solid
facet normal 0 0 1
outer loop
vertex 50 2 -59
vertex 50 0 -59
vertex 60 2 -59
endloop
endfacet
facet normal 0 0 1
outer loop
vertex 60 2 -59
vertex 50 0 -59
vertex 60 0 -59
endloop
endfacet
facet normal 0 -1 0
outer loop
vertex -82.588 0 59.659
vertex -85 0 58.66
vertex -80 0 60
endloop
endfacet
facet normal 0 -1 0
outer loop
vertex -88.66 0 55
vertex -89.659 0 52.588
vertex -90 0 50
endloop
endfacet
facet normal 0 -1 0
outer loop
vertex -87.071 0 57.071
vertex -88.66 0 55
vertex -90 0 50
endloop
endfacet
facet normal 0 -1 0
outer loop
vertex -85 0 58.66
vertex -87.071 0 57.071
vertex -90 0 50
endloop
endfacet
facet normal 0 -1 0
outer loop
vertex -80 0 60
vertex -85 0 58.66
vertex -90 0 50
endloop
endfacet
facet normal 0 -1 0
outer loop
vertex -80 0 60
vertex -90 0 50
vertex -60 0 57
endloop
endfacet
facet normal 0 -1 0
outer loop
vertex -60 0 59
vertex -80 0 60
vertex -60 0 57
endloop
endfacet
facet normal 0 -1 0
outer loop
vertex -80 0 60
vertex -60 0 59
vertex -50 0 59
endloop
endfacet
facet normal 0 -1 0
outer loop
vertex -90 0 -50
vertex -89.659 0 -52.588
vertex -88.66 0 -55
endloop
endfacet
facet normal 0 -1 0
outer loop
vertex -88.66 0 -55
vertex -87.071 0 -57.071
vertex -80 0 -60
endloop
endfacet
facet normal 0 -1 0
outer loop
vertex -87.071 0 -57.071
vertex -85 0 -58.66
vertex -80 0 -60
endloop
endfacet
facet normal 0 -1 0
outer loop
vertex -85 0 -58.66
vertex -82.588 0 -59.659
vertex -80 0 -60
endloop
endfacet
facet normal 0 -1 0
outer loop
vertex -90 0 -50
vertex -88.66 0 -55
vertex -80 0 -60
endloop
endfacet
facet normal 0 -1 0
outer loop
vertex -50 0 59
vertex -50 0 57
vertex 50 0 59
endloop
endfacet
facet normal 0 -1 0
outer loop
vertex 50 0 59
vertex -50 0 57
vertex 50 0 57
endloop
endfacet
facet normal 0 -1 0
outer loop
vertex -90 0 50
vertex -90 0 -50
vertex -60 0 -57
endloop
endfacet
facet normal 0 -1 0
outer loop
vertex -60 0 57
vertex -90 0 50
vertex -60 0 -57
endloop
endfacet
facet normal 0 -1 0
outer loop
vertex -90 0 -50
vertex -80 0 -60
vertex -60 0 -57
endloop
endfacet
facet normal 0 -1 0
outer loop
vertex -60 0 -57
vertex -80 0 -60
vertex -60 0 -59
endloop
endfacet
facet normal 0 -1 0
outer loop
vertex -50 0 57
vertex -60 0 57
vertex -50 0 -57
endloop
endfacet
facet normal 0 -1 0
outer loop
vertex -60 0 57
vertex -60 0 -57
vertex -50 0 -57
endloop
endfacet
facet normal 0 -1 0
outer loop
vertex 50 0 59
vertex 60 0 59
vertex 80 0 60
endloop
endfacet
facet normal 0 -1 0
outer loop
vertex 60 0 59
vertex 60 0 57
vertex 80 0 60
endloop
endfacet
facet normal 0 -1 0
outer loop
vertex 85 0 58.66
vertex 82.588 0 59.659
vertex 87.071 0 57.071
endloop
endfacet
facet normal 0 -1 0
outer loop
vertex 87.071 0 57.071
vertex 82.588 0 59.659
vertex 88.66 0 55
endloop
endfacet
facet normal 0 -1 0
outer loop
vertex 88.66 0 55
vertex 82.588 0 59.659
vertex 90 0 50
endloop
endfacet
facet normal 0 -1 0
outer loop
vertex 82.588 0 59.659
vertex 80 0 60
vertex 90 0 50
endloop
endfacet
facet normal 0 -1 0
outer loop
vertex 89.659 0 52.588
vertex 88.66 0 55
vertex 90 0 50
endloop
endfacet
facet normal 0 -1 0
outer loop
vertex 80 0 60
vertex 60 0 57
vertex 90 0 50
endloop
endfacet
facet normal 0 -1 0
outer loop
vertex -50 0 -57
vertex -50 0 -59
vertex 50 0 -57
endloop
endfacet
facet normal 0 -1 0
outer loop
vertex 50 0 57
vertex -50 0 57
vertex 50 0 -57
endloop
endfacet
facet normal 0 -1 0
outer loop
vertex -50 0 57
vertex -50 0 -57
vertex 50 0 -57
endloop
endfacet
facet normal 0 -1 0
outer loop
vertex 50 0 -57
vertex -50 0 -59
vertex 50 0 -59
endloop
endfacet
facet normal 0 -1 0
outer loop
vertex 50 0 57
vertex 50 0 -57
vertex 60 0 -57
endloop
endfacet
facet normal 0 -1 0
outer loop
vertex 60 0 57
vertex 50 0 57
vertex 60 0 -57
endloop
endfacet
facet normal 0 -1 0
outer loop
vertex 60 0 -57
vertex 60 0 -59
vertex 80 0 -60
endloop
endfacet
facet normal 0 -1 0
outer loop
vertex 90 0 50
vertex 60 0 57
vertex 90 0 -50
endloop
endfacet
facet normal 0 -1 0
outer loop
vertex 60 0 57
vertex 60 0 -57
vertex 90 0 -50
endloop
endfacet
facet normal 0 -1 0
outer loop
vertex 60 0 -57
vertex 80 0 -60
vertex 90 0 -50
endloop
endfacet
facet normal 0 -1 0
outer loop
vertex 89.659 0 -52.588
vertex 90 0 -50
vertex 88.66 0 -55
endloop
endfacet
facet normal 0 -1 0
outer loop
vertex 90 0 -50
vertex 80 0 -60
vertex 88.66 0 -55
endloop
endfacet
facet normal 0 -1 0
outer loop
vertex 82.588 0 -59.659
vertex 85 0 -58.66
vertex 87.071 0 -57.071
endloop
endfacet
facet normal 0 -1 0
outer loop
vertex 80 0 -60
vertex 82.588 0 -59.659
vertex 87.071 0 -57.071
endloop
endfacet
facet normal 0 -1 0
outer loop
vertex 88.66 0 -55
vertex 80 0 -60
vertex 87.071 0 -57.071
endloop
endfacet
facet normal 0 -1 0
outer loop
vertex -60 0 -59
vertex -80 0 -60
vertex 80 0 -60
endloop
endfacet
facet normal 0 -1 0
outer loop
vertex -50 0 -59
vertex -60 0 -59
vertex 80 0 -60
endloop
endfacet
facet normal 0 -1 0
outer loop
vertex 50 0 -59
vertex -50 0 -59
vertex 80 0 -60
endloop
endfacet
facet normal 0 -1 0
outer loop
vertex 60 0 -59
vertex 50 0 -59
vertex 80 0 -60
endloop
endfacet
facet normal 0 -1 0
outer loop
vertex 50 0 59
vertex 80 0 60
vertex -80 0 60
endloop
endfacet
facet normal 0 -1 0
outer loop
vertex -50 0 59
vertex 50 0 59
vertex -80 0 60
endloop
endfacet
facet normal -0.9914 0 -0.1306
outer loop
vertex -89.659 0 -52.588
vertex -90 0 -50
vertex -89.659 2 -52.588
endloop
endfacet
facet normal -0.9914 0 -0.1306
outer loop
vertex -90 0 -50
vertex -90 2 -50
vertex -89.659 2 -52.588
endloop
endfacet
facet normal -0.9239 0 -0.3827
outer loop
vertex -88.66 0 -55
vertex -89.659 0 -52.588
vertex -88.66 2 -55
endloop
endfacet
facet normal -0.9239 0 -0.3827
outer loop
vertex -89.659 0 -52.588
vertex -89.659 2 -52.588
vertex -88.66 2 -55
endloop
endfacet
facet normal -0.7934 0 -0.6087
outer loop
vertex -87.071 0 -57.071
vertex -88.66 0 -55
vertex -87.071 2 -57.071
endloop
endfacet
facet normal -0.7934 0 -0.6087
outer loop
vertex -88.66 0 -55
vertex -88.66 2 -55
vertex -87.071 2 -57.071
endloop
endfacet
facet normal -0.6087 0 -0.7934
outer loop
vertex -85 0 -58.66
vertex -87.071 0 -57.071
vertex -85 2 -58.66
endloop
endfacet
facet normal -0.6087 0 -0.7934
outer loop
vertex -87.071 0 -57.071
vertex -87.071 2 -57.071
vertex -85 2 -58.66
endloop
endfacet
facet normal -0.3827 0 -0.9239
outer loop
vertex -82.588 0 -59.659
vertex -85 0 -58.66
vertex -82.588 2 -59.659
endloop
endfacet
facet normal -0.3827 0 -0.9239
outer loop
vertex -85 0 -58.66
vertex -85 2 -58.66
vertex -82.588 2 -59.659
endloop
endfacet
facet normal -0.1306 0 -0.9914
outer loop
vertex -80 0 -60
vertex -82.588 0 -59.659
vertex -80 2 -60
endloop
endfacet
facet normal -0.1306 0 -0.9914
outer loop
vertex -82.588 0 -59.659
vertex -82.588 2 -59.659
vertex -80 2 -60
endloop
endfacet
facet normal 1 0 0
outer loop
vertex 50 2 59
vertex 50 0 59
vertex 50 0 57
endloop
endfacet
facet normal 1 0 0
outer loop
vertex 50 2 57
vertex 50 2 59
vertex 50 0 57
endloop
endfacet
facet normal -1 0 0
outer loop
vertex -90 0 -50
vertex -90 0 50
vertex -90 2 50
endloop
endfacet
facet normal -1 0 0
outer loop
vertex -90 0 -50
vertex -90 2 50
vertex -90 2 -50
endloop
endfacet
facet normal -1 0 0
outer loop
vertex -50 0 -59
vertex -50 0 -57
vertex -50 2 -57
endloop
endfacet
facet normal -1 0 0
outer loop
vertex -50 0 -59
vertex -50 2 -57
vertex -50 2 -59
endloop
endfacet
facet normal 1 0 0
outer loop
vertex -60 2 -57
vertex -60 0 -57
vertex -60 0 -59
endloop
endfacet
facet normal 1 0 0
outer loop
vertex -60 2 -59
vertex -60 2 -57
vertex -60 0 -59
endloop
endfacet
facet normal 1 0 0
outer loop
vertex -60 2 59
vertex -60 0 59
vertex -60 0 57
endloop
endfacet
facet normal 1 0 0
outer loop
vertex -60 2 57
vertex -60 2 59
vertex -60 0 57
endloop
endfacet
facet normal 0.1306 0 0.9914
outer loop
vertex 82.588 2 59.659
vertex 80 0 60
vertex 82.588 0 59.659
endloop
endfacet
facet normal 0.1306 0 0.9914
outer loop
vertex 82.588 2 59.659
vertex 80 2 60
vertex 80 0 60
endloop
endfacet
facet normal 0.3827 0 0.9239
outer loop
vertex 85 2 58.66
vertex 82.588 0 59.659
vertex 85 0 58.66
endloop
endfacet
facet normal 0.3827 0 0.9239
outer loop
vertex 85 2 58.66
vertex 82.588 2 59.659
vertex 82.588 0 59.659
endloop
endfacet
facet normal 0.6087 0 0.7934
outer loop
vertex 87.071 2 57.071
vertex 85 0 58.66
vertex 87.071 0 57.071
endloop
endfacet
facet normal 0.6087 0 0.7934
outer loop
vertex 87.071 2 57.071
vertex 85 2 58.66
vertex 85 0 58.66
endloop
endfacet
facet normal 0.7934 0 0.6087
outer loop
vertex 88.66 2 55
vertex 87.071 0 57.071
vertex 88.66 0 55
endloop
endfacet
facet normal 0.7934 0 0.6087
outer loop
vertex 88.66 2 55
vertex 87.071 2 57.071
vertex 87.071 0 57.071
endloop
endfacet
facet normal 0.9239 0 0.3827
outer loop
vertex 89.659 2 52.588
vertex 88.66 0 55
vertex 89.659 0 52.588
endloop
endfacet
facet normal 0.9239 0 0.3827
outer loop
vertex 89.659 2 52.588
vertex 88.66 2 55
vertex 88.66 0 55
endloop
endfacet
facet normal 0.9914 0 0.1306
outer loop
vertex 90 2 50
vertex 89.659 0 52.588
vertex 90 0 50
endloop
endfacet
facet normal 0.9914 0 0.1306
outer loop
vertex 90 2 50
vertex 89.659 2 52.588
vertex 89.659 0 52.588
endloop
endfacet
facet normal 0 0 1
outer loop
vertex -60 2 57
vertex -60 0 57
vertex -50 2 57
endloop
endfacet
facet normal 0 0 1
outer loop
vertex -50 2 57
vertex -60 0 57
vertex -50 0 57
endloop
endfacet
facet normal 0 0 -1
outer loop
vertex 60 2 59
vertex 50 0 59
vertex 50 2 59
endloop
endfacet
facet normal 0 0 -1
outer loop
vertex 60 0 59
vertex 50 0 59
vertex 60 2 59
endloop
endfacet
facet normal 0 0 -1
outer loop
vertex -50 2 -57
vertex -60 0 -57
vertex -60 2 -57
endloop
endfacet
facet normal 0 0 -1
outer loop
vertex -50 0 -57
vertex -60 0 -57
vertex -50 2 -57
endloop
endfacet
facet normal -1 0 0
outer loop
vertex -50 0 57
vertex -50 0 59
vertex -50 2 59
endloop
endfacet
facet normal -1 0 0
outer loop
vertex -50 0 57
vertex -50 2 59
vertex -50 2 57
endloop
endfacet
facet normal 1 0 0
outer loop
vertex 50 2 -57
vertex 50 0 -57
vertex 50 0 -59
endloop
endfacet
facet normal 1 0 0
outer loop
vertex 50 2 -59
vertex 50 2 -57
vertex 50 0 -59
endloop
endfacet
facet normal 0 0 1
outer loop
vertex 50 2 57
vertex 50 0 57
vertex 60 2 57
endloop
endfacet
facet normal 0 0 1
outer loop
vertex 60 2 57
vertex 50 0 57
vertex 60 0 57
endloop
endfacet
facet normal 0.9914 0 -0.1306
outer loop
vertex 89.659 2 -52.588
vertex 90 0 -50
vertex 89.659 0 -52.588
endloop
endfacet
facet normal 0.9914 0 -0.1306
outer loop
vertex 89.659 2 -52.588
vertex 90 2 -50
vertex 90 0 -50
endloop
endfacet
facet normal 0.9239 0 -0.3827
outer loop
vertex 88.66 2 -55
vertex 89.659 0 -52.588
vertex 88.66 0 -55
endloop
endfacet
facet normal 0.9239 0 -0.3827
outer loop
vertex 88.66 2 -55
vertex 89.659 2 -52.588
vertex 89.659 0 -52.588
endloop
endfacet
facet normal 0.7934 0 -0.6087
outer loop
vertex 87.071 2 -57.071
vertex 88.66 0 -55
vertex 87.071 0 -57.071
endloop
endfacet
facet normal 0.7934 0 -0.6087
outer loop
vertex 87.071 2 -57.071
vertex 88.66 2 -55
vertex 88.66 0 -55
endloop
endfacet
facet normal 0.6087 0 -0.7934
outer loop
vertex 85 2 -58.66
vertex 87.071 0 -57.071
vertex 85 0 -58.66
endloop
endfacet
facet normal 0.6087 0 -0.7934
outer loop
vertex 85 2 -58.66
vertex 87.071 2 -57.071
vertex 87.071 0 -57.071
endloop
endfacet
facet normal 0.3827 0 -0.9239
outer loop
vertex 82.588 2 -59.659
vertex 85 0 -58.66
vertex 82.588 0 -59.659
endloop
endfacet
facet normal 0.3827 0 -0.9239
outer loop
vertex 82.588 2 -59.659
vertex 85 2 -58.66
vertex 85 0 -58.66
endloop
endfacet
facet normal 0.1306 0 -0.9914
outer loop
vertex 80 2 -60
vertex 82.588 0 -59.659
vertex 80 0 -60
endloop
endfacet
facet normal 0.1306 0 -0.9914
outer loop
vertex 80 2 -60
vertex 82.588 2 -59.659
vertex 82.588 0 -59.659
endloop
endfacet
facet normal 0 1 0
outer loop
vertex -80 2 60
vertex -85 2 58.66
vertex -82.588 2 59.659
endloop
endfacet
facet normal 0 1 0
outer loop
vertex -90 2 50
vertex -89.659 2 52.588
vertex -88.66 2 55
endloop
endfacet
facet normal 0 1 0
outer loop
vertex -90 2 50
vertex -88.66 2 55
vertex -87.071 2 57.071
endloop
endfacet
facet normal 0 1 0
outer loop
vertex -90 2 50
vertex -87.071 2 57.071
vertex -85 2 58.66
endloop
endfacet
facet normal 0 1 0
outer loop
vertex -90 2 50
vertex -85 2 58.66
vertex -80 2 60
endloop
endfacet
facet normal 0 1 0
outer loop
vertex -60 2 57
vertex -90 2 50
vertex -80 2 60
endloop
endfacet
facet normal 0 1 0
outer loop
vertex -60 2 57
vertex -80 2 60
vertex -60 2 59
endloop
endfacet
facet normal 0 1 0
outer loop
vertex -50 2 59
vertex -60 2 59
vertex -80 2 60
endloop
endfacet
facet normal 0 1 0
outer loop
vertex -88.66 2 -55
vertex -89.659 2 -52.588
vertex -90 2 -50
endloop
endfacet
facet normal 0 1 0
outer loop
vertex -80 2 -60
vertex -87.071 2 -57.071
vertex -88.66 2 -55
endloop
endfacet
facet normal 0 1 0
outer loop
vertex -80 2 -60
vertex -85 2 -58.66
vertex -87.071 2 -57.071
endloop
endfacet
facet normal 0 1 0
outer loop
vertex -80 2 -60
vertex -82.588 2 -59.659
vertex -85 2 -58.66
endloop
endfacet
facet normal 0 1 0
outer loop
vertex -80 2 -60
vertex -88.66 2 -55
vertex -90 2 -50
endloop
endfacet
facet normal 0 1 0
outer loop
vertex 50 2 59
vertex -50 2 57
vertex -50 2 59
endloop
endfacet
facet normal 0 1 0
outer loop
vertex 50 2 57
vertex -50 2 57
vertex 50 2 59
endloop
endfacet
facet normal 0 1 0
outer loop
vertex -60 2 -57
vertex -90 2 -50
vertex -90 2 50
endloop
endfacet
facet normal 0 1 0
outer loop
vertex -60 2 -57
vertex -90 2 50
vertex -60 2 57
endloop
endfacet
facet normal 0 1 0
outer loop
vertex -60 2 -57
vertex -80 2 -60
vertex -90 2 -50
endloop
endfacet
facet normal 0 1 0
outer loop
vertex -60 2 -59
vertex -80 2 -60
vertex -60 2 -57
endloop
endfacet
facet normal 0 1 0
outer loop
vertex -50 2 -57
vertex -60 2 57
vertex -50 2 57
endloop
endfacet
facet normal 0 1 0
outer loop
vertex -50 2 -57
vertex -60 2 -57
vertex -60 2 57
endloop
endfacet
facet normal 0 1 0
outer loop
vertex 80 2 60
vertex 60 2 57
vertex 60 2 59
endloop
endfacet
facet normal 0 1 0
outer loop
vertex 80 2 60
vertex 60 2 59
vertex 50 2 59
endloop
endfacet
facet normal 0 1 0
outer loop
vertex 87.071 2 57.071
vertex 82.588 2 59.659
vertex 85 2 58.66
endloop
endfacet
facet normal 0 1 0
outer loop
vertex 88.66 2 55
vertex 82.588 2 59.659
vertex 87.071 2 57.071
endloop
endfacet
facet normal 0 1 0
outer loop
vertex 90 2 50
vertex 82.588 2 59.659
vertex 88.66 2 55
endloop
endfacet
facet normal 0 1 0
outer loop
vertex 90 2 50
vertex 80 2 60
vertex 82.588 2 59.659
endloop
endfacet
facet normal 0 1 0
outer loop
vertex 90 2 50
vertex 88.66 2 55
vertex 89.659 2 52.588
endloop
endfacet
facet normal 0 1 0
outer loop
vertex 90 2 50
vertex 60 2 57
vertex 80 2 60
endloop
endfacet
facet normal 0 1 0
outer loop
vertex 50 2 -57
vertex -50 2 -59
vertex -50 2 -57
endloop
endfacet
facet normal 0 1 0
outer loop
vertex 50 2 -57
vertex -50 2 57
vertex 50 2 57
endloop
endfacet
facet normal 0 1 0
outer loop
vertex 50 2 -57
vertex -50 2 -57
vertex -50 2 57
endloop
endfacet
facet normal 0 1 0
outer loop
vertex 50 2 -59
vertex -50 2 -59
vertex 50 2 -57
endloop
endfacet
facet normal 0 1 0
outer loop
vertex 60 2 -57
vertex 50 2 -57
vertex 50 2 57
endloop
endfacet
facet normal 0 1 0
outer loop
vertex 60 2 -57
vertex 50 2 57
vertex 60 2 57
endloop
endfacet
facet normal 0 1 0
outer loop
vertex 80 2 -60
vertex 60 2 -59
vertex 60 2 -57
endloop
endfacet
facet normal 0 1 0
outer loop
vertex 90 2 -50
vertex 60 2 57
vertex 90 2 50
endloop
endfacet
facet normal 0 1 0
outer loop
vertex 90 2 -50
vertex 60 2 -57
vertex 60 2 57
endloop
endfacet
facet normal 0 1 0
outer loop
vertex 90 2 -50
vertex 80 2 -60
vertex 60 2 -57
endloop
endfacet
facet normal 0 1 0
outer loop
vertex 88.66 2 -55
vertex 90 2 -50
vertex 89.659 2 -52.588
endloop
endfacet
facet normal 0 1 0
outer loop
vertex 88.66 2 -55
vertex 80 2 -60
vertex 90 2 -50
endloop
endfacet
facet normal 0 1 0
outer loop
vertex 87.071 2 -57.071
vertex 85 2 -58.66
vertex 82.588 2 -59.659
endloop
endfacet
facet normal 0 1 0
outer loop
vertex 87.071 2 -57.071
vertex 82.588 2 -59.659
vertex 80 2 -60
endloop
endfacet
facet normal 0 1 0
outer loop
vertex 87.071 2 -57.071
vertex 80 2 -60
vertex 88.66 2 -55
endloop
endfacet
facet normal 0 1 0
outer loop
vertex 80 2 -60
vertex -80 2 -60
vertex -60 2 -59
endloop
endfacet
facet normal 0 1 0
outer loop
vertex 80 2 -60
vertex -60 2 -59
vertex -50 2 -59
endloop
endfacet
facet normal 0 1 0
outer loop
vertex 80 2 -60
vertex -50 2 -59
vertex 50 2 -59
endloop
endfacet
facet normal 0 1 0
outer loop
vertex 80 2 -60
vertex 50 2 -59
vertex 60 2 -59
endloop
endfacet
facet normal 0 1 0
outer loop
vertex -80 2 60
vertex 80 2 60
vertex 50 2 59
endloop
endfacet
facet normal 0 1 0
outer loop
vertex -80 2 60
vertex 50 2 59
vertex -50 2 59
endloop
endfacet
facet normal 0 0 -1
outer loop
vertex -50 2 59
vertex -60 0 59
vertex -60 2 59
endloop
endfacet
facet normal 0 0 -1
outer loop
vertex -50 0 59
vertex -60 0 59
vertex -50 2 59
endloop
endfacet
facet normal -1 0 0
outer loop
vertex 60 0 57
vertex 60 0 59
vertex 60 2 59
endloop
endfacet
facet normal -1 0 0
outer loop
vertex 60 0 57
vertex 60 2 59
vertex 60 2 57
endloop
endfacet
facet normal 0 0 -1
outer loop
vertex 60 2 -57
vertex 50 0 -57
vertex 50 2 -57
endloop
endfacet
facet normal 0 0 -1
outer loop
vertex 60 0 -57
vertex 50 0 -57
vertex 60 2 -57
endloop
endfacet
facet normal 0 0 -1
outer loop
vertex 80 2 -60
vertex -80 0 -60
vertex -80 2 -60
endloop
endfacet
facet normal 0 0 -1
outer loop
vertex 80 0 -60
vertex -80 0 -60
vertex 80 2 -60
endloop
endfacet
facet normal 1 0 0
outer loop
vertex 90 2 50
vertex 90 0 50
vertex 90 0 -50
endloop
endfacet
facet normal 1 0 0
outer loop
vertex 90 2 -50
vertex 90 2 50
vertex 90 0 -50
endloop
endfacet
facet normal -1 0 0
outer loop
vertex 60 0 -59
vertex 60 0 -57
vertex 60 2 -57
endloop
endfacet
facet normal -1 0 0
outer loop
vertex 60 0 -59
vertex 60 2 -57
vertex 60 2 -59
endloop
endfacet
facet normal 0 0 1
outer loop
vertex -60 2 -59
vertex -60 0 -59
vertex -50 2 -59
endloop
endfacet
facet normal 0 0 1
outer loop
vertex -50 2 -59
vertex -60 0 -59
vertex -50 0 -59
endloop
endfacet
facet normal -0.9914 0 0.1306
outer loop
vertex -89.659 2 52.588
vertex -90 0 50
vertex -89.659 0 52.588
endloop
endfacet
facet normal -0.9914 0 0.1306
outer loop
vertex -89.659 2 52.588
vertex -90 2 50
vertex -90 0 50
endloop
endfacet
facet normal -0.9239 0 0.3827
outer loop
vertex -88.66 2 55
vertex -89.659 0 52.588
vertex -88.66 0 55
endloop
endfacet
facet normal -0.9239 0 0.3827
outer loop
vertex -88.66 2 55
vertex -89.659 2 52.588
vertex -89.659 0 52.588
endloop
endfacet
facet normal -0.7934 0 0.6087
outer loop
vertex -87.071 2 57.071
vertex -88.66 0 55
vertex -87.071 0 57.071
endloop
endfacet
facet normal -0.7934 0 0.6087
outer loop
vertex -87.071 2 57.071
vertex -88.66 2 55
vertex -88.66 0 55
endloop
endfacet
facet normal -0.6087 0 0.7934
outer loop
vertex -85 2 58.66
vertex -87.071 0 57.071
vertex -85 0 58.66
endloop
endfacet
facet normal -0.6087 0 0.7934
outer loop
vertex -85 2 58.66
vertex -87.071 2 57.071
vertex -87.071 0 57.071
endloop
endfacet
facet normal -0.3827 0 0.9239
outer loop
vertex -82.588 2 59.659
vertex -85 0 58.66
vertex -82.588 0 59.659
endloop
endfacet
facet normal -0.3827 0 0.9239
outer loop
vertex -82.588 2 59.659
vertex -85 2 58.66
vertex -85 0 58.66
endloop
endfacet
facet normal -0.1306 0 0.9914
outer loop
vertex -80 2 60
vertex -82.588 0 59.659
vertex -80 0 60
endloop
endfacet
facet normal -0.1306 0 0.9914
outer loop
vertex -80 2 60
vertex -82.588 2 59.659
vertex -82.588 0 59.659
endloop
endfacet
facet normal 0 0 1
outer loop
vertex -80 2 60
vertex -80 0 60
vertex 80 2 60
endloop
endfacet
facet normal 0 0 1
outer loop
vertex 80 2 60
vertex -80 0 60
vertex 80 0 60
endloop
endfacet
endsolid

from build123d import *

# Parameters (mm, degrees)
SKETCH1_W           = 180
SKETCH1_H           = 120
BOSS_EXTRUDE1_DEPTH = 2
FILLET1_R           = 10
FILLET2_R           = 10
FILLET3_R           = 10
FILLET4_R           = 10
SKETCH3_W           = 10
SKETCH3_H           = 2
CUT_EXTRUDE1_DEPTH  = 7


with BuildPart() as part:
    # Sketch1 → Boss-Extrude1 (new body)
    with BuildSketch(Plane(origin=(0, 0, 0), x_dir=(1, 0, 0), z_dir=(0, 1, 0))):
        Rectangle(SKETCH1_W, SKETCH1_H)
    extrude(amount=BOSS_EXTRUDE1_DEPTH)

    # Fillet1
    fillet1_edges = [part.edges().sort_by_distance(p)[0] for p in [
        (-90, 1, 60),
    ]]
    fillet(fillet1_edges, radius=FILLET1_R)

    # Fillet2
    fillet2_edges = [part.edges().sort_by_distance(p)[0] for p in [
        (-90, 1, -60),
    ]]
    fillet(fillet2_edges, radius=FILLET2_R)

    # Fillet3
    fillet3_edges = [part.edges().sort_by_distance(p)[0] for p in [
        (90, 1, 60),
    ]]
    fillet(fillet3_edges, radius=FILLET3_R)

    # Fillet4
    fillet4_edges = [part.edges().sort_by_distance(p)[0] for p in [
        (90, 1, -60),
    ]]
    fillet(fillet4_edges, radius=FILLET4_R)

    # Sketch3 → Cut-Extrude1 (cut)
    with BuildSketch(Plane(origin=(0, 0, 0), x_dir=(1, 0, 0), z_dir=(0, 1, 0))):
        with Locations((-55, 58)):
            Rectangle(SKETCH3_W, SKETCH3_H)
        with Locations((55, 58)):
            Rectangle(SKETCH3_W, SKETCH3_H)
        with Locations((-55, -58)):
            Rectangle(SKETCH3_W, SKETCH3_H)
        with Locations((55, -58)):
            Rectangle(SKETCH3_W, SKETCH3_H)
    extrude(amount=CUT_EXTRUDE1_DEPTH, mode=Mode.SUBTRACT)


solid = part.part
